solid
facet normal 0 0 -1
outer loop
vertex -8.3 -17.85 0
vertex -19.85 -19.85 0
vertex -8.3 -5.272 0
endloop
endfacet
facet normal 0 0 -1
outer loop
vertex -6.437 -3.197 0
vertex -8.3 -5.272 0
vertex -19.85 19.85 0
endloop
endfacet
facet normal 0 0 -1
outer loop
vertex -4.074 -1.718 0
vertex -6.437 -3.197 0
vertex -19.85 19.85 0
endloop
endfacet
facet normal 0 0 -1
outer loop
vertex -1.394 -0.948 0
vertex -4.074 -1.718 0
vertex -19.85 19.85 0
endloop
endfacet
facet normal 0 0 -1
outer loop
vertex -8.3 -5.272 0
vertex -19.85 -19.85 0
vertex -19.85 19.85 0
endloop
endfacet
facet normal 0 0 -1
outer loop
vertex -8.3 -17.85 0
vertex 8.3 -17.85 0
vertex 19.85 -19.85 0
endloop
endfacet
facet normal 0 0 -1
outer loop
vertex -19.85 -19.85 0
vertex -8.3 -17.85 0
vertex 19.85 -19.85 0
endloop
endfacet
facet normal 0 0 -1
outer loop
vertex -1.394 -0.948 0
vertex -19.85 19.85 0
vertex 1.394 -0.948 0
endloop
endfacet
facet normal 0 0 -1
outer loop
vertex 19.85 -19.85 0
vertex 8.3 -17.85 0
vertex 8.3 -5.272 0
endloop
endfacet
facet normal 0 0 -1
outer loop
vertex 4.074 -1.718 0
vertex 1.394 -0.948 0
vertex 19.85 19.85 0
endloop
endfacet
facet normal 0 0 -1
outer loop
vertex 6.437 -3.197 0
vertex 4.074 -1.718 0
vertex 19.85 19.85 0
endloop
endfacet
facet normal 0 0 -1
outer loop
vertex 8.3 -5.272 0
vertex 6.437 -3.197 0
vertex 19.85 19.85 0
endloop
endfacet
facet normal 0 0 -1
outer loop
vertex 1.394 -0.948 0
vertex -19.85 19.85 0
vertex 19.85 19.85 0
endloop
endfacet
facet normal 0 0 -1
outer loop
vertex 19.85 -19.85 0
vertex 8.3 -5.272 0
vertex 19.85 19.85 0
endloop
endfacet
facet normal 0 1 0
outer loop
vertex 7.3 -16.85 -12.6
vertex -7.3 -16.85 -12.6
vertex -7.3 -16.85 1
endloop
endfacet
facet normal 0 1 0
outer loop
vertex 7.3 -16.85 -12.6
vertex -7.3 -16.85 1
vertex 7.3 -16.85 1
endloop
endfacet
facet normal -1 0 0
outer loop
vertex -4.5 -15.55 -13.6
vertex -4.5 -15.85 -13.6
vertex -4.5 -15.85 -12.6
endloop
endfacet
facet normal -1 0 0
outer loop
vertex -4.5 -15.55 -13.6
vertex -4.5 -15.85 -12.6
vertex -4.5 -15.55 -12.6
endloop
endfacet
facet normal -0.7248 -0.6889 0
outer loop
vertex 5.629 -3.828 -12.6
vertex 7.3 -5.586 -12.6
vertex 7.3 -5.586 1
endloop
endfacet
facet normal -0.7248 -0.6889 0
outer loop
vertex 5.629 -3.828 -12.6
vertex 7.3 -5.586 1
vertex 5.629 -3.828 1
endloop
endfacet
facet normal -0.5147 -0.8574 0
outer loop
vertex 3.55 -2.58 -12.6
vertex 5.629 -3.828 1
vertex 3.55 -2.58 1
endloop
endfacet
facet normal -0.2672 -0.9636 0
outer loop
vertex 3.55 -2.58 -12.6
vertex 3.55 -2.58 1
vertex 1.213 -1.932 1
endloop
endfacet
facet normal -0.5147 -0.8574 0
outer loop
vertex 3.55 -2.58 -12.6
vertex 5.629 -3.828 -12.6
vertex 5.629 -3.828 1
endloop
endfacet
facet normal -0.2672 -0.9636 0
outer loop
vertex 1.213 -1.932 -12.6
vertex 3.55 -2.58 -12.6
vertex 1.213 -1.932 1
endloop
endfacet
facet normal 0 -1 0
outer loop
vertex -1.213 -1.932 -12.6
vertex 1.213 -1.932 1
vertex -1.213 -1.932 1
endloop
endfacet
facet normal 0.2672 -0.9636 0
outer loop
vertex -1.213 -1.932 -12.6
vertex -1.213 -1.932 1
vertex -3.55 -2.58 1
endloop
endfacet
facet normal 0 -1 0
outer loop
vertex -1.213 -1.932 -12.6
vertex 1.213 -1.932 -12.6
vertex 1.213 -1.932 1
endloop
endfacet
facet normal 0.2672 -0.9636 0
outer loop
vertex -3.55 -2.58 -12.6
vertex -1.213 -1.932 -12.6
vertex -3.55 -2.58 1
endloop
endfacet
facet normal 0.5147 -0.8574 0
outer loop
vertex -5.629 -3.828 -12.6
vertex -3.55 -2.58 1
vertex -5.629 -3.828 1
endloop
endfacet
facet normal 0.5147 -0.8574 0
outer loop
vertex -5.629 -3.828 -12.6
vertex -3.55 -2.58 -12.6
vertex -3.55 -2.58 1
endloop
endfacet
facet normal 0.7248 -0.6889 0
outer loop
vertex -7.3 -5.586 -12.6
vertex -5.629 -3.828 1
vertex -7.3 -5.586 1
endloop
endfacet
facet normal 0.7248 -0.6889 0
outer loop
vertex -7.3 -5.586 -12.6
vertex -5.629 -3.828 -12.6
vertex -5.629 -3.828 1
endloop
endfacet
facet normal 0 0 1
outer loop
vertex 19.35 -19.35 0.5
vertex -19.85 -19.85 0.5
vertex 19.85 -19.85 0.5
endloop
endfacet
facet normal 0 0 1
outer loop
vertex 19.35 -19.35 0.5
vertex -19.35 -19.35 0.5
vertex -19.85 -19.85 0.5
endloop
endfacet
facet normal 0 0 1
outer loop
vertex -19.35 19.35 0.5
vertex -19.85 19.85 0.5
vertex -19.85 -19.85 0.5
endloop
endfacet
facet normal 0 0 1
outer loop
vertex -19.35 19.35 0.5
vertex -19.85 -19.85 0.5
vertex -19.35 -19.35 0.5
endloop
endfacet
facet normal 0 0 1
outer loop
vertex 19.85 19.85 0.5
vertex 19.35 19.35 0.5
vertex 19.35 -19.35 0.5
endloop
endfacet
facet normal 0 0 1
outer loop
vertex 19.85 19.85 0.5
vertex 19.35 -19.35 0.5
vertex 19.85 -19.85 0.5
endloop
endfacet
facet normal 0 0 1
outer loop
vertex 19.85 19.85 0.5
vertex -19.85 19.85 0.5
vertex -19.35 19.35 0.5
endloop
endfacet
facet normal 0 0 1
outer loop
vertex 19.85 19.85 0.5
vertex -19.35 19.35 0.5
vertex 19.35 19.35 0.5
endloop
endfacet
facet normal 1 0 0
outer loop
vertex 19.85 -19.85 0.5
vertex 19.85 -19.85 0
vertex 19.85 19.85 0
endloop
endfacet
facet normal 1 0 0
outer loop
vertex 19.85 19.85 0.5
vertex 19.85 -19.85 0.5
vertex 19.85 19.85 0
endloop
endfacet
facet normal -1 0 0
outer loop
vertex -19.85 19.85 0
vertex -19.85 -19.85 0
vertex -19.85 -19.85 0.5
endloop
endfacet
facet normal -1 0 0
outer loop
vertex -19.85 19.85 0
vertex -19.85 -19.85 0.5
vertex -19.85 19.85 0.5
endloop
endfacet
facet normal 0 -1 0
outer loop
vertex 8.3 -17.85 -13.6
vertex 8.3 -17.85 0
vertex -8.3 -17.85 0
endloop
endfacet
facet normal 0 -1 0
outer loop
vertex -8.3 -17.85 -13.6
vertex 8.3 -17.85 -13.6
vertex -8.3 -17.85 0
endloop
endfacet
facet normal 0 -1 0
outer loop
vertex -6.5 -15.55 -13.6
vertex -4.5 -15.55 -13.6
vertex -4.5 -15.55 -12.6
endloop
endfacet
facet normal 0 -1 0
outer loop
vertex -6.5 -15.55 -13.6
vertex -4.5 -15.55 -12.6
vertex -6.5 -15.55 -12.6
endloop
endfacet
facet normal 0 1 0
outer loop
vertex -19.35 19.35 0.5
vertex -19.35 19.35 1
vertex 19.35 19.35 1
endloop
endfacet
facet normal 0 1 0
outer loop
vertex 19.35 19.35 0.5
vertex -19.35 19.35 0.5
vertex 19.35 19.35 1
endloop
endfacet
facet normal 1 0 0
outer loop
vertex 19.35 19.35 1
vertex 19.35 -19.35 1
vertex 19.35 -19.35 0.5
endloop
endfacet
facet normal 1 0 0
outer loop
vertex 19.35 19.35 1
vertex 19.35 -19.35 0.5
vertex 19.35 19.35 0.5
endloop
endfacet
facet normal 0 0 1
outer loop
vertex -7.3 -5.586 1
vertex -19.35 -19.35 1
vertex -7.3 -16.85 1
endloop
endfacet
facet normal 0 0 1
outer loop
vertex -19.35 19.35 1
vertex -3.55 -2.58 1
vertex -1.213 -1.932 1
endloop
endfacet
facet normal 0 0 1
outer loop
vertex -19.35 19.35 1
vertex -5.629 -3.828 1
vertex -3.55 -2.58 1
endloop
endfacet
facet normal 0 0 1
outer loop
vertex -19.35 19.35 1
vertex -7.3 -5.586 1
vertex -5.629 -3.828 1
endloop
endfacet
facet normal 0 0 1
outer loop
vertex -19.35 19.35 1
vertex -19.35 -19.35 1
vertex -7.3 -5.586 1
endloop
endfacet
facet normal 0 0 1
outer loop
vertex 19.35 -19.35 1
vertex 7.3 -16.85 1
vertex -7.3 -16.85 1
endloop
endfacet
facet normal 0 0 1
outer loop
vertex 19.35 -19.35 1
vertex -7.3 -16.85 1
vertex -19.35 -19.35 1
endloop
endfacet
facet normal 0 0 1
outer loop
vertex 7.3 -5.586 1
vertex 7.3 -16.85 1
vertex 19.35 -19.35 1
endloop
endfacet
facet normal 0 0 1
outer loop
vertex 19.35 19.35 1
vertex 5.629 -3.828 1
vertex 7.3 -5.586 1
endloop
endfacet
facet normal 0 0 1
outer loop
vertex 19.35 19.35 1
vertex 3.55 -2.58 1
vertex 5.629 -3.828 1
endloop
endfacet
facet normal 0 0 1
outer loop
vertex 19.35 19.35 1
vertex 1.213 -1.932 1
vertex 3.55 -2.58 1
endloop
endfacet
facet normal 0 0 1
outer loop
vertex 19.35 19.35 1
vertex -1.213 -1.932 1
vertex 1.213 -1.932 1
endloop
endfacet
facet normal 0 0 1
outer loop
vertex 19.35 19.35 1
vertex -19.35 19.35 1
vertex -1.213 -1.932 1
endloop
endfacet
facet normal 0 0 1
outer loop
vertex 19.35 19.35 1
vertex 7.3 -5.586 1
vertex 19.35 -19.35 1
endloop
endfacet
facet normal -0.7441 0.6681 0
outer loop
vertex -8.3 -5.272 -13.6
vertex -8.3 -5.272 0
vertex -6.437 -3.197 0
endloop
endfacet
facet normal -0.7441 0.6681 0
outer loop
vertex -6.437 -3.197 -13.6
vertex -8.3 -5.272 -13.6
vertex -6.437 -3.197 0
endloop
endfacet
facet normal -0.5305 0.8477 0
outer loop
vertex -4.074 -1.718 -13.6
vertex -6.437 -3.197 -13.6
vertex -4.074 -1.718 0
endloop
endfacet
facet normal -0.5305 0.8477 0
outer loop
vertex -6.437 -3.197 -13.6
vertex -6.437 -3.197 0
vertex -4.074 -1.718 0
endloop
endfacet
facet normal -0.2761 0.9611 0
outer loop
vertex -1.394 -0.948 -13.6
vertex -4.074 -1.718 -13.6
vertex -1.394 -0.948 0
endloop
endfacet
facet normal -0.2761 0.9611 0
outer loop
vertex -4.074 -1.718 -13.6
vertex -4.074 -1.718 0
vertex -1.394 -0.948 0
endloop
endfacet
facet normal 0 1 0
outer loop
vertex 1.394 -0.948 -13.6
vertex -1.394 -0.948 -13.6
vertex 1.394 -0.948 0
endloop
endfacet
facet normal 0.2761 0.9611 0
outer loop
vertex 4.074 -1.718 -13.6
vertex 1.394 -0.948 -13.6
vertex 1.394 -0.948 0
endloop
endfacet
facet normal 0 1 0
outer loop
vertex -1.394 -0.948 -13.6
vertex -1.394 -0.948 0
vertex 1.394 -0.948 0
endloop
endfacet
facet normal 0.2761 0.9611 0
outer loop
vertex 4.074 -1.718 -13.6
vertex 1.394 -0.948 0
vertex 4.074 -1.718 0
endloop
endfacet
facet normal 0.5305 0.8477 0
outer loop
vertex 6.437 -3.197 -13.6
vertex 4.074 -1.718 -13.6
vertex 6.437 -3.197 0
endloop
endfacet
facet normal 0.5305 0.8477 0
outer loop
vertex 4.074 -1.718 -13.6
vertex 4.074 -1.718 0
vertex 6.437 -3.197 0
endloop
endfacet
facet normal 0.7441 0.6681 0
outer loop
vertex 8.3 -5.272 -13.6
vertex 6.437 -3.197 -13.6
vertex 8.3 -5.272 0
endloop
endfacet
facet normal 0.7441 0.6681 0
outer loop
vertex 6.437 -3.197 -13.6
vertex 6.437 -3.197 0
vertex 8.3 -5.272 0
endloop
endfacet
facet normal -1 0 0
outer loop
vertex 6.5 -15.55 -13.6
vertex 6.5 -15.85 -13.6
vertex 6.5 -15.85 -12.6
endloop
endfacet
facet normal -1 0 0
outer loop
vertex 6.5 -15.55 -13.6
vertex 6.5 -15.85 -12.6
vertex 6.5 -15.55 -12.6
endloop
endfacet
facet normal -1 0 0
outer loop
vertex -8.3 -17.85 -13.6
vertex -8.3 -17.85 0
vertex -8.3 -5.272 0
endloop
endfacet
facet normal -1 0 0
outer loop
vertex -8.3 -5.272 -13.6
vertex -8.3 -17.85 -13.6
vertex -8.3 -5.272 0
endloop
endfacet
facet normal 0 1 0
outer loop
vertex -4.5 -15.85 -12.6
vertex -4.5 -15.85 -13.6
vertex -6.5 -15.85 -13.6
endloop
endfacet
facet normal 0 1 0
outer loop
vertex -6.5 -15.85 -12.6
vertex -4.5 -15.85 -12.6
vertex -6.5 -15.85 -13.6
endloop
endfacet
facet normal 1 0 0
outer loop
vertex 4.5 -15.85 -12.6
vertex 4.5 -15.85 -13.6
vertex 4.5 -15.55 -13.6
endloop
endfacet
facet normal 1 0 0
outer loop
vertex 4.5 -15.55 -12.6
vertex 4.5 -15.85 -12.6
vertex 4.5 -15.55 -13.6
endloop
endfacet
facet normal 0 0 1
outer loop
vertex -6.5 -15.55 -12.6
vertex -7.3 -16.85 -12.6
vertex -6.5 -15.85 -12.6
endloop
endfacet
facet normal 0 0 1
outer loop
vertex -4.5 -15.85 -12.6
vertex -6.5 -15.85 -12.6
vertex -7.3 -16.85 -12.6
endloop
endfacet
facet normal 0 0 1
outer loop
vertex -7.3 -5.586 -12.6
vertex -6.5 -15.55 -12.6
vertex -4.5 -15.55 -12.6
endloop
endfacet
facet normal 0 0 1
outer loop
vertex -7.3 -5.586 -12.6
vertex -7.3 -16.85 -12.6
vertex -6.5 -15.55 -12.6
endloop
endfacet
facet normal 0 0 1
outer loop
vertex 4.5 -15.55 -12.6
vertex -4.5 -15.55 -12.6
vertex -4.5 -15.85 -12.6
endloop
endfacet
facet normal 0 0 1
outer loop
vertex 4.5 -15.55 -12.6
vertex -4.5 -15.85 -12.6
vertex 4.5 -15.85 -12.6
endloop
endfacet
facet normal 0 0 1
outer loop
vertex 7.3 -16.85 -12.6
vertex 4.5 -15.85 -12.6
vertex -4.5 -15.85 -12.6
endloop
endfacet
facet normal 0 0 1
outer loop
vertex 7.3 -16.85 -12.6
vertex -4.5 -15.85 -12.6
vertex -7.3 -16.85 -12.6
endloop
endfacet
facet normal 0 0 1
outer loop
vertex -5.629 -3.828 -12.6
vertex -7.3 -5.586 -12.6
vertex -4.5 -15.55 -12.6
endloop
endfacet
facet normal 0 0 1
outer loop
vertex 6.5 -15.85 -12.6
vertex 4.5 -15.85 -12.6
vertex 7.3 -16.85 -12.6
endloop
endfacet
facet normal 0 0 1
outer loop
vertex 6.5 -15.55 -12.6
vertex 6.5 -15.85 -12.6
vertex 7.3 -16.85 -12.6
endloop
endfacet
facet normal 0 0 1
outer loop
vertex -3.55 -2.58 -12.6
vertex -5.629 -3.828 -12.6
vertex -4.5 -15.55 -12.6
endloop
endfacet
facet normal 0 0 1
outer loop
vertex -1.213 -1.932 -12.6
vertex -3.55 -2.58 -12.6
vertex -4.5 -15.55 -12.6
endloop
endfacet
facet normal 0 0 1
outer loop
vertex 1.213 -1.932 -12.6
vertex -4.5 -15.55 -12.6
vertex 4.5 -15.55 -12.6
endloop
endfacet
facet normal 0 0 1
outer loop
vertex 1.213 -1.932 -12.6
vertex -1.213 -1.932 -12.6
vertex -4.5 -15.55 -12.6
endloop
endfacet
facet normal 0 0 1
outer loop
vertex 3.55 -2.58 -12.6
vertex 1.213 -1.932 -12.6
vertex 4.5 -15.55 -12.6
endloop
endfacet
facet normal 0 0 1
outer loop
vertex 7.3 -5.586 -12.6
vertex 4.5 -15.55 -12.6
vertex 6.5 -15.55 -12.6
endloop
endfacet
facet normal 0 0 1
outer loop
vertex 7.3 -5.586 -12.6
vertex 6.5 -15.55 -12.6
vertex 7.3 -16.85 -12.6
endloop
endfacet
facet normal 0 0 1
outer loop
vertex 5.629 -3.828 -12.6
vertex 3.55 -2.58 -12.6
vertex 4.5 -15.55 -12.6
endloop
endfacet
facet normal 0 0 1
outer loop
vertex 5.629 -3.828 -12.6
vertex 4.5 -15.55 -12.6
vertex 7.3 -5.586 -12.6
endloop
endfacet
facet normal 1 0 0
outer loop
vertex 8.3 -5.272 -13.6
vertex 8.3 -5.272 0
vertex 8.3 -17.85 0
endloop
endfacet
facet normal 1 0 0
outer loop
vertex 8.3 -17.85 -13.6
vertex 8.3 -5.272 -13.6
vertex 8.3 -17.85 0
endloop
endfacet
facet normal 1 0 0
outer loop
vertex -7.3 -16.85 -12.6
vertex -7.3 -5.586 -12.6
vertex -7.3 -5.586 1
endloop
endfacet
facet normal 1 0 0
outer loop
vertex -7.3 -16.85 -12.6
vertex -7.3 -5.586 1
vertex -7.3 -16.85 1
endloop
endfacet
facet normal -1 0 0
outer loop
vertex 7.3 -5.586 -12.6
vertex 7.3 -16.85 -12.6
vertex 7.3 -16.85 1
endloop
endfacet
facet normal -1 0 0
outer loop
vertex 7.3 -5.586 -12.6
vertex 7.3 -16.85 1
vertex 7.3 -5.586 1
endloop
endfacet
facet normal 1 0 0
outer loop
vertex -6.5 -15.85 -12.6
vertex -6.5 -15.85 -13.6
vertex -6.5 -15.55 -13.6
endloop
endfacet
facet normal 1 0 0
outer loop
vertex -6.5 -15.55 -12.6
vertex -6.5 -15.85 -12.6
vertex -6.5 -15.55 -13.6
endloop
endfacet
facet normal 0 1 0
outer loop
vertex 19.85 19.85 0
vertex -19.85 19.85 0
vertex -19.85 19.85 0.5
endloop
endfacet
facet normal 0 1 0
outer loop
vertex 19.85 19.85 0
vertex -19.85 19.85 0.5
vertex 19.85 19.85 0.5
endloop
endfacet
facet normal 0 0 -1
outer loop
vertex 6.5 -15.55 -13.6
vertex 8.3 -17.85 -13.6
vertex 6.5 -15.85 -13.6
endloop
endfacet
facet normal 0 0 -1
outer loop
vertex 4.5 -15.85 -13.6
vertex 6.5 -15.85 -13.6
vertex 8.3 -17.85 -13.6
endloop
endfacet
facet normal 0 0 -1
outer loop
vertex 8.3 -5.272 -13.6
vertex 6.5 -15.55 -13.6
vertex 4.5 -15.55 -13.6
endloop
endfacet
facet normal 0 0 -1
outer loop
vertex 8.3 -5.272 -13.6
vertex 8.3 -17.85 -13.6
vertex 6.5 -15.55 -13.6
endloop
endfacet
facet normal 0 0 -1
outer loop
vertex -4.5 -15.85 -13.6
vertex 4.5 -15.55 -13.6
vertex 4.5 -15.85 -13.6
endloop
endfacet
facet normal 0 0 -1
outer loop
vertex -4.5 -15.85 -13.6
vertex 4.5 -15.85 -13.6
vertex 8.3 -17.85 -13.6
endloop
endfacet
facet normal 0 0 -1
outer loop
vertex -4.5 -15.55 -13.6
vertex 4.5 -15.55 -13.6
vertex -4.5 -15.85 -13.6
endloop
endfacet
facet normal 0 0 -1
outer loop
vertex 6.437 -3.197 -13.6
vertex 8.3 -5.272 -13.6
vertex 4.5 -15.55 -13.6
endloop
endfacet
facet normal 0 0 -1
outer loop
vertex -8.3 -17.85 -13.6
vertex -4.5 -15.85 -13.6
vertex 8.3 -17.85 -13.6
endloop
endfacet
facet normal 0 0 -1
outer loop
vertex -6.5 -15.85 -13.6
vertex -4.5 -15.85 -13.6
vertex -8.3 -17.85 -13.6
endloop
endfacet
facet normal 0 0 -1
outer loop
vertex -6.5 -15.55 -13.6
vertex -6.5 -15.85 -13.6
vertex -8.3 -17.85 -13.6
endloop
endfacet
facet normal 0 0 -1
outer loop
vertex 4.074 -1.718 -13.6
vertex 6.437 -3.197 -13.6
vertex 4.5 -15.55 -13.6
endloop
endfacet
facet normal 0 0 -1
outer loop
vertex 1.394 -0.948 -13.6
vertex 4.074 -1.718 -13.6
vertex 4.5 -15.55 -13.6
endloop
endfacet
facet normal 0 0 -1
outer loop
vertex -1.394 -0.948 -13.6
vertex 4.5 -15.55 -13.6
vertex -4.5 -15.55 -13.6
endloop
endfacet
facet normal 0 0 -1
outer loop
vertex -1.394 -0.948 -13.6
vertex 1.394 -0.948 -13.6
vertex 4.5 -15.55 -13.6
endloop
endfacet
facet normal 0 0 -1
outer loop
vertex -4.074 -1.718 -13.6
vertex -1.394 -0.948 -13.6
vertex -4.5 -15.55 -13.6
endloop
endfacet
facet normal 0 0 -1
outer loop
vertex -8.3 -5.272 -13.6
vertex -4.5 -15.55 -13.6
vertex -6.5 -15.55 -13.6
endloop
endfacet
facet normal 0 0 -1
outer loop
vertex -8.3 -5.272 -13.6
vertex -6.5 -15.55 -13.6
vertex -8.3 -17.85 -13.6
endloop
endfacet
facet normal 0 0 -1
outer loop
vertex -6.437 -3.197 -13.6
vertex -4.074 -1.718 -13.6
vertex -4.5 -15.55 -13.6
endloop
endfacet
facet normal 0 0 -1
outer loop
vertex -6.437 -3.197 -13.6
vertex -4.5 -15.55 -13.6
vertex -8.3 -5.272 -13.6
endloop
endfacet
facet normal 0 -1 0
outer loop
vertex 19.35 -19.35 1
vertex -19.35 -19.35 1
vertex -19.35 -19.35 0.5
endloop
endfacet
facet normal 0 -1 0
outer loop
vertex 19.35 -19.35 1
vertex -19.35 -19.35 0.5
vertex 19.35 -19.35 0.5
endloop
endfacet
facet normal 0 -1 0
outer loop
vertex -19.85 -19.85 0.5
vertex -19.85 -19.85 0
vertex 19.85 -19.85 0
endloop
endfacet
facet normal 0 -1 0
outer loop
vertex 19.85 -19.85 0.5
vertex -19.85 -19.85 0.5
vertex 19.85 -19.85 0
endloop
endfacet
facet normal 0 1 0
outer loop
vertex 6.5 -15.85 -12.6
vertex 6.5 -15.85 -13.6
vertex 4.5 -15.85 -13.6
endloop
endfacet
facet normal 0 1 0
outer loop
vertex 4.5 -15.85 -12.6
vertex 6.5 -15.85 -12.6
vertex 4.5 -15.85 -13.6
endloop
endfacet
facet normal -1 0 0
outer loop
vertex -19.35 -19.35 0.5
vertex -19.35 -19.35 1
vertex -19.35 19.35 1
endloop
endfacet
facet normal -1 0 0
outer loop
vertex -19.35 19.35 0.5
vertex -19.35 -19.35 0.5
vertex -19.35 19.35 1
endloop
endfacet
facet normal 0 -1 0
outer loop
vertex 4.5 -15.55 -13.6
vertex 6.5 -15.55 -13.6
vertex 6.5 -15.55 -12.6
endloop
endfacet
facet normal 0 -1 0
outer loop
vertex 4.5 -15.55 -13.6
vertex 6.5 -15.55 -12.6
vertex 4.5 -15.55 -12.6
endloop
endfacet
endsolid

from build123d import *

# Parameters (mm, degrees)
SKETCH1_W           = 39.7
SKETCH1_H           = 39.7
BOSS_EXTRUDE1_DEPTH = 1
BOSS_EXTRUDE2_DEPTH = 13.6
SHELL1_START        = -12.6
SHELL1_DEPTH        = 13.6
SKETCH3_W           = 39.7
SKETCH3_H           = 39.7
SKETCH3_W_2         = 38.7
SKETCH3_H_2         = 38.7
CUT_EXTRUDE1_DEPTH  = 0.5
CUT_EXTRUDE2_REACH  = 33.642
SKETCH4_W           = 2
SKETCH4_H           = 0.3


# Read off the part's stored shape, not the designer's step: Shell1
with BuildPart() as part:
    # Sketch1 → Boss-Extrude1 (new body)
    with BuildSketch(Plane.XY):
        Rectangle(SKETCH1_W, SKETCH1_H)
    extrude(amount=BOSS_EXTRUDE1_DEPTH)

    # Sketch2 → Boss-Extrude2 (add)
    with BuildSketch(Plane(origin=(0, 0, 0), x_dir=(-1, 0, 0), z_dir=(0, 0, -1))):
        with BuildLine():
            Line((-8.3, -17.85), (8.3, -17.85))
            Line((8.3, -17.85), (8.3, -5.272366093))
            ThreePointArc((8.3, -5.272366093), (0, -0.85), (-8.3, -5.272366093))
            Line((-8.3, -5.272366093), (-8.3, -17.85))
        make_face()
    extrude(amount=BOSS_EXTRUDE2_DEPTH)

    # Shell1 outline → Shell1 (cut)
    with BuildSketch(Plane.XY.offset(SHELL1_START)):
        with BuildLine():
            Line((7.3, -16.85), (7.3, -5.585971125))
            ThreePointArc((7.3, -5.585971125), (0, -1.85), (-7.3, -5.585971125))
            Line((-7.3, -5.585971125), (-7.3, -16.85))
            Line((-7.3, -16.85), (7.3, -16.85))
        make_face()
    extrude(amount=SHELL1_DEPTH, mode=Mode.SUBTRACT)

    # Sketch3 → Cut-Extrude1 (cut)
    with BuildSketch(Plane.XY.offset(1)):
        Rectangle(SKETCH3_W, SKETCH3_H)
        Rectangle(SKETCH3_W_2, SKETCH3_H_2, mode=Mode.SUBTRACT)
    extrude(amount=-CUT_EXTRUDE1_DEPTH, mode=Mode.SUBTRACT)

    # Sketch4 → Cut-Extrude2 (cut, up to next)
    with BuildSketch(Plane(origin=(0, 0, -13.6), x_dir=(-1, 0, 0), z_dir=(0, 0, -1)), mode=Mode.PRIVATE) as cut_extrude2_sk1:
        with Locations((-5.5, -15.7)):
            Rectangle(SKETCH4_W, SKETCH4_H)
    cut_extrude2_tool1 = extrude(cut_extrude2_sk1.sketch, amount=-CUT_EXTRUDE2_REACH, mode=Mode.PRIVATE) & part.part
    # Sketch4 → Cut-Extrude2 (cut, up to next)
    with BuildSketch(Plane(origin=(0, 0, -13.6), x_dir=(-1, 0, 0), z_dir=(0, 0, -1)), mode=Mode.PRIVATE) as cut_extrude2_sk2:
        with Locations((5.5, -15.7)):
            Rectangle(SKETCH4_W, SKETCH4_H)
    cut_extrude2_tool2 = extrude(cut_extrude2_sk2.sketch, amount=-CUT_EXTRUDE2_REACH, mode=Mode.PRIVATE) & part.part
    add(cut_extrude2_tool1.solids().sort_by_distance((5.5, -15.7, -13.6))[0], mode=Mode.SUBTRACT)
    add(cut_extrude2_tool2.solids().sort_by_distance((-5.5, -15.7, -13.6))[0], mode=Mode.SUBTRACT)


solid = part.part
